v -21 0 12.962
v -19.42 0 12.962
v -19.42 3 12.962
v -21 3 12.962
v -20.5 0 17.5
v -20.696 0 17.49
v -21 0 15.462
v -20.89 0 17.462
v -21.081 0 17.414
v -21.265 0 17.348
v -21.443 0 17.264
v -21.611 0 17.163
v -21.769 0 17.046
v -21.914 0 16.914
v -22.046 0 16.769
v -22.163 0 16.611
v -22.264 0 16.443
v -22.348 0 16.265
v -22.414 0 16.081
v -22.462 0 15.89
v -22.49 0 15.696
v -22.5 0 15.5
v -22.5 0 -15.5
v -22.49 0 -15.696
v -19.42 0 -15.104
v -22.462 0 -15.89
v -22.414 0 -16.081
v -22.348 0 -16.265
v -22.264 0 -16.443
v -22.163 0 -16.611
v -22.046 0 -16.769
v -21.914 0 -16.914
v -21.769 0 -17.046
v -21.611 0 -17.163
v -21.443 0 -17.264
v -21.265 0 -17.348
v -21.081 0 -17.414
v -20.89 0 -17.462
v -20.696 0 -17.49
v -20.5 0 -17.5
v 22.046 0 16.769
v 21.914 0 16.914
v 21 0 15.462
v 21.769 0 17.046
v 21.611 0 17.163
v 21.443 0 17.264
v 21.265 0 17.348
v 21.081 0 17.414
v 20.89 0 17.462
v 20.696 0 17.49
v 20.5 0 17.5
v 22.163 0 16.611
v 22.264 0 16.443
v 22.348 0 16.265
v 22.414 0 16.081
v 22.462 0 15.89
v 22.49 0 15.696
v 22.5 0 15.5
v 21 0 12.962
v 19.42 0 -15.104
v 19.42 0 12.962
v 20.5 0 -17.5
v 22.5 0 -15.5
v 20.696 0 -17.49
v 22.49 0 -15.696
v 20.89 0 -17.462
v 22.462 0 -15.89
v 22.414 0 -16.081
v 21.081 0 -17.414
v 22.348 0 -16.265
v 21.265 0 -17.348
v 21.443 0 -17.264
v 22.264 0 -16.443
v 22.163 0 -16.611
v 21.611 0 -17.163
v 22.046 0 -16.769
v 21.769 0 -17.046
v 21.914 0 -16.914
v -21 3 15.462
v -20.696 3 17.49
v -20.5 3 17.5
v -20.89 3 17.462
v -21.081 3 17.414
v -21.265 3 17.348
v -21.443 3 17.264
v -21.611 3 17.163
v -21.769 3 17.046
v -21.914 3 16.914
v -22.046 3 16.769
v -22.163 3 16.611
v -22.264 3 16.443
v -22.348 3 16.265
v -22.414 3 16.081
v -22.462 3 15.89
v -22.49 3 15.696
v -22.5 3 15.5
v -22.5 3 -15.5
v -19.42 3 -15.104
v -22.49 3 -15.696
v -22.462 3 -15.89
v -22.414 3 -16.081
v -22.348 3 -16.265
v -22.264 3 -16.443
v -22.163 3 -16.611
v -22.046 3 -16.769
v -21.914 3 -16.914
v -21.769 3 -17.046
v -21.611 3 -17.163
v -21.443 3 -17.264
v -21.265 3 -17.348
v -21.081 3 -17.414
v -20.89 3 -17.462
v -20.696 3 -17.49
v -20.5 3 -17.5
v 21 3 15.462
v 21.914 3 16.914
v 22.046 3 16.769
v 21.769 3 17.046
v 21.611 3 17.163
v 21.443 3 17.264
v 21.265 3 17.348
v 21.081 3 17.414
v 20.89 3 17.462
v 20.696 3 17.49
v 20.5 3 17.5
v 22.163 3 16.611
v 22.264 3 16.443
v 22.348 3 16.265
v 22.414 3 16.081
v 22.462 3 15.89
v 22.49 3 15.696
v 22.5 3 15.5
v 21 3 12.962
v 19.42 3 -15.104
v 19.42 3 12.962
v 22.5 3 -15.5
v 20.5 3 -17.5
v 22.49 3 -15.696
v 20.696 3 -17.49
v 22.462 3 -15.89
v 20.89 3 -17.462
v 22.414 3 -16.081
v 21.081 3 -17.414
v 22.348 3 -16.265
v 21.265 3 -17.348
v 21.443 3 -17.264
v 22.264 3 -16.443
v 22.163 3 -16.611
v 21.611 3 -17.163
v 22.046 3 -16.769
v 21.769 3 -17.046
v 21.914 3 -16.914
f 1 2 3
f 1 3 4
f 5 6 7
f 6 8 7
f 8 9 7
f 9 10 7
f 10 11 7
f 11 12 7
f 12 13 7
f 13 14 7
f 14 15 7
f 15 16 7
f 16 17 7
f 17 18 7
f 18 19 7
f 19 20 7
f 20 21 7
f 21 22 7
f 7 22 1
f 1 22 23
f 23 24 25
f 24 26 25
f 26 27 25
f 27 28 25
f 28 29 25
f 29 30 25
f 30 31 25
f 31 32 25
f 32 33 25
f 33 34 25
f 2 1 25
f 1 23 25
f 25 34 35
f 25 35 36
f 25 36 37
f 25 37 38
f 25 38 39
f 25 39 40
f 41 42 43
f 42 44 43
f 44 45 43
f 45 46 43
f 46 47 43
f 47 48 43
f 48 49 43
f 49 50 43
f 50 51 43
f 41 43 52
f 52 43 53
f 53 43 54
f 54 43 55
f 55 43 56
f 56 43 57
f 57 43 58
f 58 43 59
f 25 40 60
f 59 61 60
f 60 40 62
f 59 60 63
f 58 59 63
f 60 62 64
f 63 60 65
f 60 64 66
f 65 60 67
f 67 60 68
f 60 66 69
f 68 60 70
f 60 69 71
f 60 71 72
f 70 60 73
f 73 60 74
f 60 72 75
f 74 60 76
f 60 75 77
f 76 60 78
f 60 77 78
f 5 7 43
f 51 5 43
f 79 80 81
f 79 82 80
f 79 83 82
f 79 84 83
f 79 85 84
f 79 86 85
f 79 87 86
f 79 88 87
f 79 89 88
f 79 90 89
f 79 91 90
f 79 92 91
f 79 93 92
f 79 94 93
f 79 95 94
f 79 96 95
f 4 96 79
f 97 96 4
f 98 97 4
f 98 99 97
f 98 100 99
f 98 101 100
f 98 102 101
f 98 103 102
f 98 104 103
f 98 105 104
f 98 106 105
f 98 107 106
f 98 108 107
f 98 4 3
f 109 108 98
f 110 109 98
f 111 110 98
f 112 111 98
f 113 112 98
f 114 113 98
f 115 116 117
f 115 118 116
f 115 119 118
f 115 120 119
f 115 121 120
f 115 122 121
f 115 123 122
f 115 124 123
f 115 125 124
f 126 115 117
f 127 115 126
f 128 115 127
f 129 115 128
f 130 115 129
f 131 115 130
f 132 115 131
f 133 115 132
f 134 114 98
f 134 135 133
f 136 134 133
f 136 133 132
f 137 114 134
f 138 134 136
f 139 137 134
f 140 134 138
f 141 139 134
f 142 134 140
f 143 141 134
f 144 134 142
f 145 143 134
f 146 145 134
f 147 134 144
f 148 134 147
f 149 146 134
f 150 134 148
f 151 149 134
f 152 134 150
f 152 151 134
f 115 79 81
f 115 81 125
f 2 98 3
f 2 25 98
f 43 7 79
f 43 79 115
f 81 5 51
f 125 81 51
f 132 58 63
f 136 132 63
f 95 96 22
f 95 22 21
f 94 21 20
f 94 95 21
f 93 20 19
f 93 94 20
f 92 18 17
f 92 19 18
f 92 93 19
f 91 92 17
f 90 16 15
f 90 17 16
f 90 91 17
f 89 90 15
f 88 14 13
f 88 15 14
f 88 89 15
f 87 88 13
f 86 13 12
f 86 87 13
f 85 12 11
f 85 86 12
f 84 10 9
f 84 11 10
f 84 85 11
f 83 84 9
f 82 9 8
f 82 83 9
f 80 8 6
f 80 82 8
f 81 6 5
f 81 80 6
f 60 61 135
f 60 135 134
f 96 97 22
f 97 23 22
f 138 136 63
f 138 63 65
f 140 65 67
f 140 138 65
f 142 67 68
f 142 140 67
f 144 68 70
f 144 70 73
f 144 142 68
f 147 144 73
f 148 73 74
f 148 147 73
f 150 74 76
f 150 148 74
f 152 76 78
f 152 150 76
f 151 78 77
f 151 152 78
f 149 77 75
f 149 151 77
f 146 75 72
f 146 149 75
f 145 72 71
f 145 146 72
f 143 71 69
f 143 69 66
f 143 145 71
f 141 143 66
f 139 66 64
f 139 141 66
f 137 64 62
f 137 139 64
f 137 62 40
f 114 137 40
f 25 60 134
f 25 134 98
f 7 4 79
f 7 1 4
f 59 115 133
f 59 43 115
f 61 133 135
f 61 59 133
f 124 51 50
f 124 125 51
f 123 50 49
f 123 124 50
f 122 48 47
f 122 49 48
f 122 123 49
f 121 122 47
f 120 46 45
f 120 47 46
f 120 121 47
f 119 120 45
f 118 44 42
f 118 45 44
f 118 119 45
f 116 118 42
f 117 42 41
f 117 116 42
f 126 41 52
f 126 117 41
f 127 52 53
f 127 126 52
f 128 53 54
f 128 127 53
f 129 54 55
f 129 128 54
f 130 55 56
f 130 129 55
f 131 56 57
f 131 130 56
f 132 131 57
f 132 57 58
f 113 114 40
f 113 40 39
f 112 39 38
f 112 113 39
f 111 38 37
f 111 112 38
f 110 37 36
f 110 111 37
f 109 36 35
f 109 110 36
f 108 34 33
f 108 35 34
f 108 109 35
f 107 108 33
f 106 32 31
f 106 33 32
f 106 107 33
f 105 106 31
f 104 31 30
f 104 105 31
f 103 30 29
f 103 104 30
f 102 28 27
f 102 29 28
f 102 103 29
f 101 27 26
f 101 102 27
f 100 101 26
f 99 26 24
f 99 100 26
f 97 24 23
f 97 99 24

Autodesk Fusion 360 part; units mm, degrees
sketch "Sketch1" plane through (0, 0, 0) normal (0, 1, 0) x (1, 0, 0)
  line L0 (22.5, 17.5) -> (-22.5, 17.5)
  line L1 (-22.5, 17.5) -> (-22.5, -17.5)
  line L2 (-22.5, -17.5) -> (22.5, -17.5)
  line L3 (22.5, -17.5) -> (22.5, 17.5)
  line L4 (22.5, 17.5) -> (-22.5, -17.5) construction
  line L5 (-22.5, 17.5) -> (22.5, -17.5) construction
  line L6 (21, -12.9623) -> (-21, -12.9623)
  line L7 (-21, -12.9623) -> (-21, -15.4623)
  line L8 (-21, -15.4623) -> (21, -15.4623)
  line L9 (21, -15.4623) -> (21, -12.9623)
  line L10 (21, -12.9623) -> (-21, -15.4623) construction
  line L11 (-21, -12.9623) -> (21, -15.4623) construction
  line L12 (19.42, 15.1045) -> (-19.42, 15.1045)
  line L13 (-19.42, 15.1045) -> (-19.42, -15.1045)
  line L14 (-19.42, -15.1045) -> (19.42, -15.1045)
  line L15 (19.42, -15.1045) -> (19.42, 15.1045)
  line L16 (19.42, 15.1045) -> (-19.42, -15.1045) construction
  line L17 (-19.42, 15.1045) -> (19.42, -15.1045) construction
  point P0 (0, -14.2123)
  dimension "d1" = 45
  dimension "d2" = 35
  dimension "d3" = 42
  dimension "d4" = 2.5
extrude "Extrude1" add sketch "Sketch1" along normal blind 3
fillet "Fillet1" radius 2 4 edges at (22.5, 1.5, 17.5) (22.5, 1.5, -17.5) (-22.5, 1.5, 17.5) (-22.5, 1.5, -17.5)
